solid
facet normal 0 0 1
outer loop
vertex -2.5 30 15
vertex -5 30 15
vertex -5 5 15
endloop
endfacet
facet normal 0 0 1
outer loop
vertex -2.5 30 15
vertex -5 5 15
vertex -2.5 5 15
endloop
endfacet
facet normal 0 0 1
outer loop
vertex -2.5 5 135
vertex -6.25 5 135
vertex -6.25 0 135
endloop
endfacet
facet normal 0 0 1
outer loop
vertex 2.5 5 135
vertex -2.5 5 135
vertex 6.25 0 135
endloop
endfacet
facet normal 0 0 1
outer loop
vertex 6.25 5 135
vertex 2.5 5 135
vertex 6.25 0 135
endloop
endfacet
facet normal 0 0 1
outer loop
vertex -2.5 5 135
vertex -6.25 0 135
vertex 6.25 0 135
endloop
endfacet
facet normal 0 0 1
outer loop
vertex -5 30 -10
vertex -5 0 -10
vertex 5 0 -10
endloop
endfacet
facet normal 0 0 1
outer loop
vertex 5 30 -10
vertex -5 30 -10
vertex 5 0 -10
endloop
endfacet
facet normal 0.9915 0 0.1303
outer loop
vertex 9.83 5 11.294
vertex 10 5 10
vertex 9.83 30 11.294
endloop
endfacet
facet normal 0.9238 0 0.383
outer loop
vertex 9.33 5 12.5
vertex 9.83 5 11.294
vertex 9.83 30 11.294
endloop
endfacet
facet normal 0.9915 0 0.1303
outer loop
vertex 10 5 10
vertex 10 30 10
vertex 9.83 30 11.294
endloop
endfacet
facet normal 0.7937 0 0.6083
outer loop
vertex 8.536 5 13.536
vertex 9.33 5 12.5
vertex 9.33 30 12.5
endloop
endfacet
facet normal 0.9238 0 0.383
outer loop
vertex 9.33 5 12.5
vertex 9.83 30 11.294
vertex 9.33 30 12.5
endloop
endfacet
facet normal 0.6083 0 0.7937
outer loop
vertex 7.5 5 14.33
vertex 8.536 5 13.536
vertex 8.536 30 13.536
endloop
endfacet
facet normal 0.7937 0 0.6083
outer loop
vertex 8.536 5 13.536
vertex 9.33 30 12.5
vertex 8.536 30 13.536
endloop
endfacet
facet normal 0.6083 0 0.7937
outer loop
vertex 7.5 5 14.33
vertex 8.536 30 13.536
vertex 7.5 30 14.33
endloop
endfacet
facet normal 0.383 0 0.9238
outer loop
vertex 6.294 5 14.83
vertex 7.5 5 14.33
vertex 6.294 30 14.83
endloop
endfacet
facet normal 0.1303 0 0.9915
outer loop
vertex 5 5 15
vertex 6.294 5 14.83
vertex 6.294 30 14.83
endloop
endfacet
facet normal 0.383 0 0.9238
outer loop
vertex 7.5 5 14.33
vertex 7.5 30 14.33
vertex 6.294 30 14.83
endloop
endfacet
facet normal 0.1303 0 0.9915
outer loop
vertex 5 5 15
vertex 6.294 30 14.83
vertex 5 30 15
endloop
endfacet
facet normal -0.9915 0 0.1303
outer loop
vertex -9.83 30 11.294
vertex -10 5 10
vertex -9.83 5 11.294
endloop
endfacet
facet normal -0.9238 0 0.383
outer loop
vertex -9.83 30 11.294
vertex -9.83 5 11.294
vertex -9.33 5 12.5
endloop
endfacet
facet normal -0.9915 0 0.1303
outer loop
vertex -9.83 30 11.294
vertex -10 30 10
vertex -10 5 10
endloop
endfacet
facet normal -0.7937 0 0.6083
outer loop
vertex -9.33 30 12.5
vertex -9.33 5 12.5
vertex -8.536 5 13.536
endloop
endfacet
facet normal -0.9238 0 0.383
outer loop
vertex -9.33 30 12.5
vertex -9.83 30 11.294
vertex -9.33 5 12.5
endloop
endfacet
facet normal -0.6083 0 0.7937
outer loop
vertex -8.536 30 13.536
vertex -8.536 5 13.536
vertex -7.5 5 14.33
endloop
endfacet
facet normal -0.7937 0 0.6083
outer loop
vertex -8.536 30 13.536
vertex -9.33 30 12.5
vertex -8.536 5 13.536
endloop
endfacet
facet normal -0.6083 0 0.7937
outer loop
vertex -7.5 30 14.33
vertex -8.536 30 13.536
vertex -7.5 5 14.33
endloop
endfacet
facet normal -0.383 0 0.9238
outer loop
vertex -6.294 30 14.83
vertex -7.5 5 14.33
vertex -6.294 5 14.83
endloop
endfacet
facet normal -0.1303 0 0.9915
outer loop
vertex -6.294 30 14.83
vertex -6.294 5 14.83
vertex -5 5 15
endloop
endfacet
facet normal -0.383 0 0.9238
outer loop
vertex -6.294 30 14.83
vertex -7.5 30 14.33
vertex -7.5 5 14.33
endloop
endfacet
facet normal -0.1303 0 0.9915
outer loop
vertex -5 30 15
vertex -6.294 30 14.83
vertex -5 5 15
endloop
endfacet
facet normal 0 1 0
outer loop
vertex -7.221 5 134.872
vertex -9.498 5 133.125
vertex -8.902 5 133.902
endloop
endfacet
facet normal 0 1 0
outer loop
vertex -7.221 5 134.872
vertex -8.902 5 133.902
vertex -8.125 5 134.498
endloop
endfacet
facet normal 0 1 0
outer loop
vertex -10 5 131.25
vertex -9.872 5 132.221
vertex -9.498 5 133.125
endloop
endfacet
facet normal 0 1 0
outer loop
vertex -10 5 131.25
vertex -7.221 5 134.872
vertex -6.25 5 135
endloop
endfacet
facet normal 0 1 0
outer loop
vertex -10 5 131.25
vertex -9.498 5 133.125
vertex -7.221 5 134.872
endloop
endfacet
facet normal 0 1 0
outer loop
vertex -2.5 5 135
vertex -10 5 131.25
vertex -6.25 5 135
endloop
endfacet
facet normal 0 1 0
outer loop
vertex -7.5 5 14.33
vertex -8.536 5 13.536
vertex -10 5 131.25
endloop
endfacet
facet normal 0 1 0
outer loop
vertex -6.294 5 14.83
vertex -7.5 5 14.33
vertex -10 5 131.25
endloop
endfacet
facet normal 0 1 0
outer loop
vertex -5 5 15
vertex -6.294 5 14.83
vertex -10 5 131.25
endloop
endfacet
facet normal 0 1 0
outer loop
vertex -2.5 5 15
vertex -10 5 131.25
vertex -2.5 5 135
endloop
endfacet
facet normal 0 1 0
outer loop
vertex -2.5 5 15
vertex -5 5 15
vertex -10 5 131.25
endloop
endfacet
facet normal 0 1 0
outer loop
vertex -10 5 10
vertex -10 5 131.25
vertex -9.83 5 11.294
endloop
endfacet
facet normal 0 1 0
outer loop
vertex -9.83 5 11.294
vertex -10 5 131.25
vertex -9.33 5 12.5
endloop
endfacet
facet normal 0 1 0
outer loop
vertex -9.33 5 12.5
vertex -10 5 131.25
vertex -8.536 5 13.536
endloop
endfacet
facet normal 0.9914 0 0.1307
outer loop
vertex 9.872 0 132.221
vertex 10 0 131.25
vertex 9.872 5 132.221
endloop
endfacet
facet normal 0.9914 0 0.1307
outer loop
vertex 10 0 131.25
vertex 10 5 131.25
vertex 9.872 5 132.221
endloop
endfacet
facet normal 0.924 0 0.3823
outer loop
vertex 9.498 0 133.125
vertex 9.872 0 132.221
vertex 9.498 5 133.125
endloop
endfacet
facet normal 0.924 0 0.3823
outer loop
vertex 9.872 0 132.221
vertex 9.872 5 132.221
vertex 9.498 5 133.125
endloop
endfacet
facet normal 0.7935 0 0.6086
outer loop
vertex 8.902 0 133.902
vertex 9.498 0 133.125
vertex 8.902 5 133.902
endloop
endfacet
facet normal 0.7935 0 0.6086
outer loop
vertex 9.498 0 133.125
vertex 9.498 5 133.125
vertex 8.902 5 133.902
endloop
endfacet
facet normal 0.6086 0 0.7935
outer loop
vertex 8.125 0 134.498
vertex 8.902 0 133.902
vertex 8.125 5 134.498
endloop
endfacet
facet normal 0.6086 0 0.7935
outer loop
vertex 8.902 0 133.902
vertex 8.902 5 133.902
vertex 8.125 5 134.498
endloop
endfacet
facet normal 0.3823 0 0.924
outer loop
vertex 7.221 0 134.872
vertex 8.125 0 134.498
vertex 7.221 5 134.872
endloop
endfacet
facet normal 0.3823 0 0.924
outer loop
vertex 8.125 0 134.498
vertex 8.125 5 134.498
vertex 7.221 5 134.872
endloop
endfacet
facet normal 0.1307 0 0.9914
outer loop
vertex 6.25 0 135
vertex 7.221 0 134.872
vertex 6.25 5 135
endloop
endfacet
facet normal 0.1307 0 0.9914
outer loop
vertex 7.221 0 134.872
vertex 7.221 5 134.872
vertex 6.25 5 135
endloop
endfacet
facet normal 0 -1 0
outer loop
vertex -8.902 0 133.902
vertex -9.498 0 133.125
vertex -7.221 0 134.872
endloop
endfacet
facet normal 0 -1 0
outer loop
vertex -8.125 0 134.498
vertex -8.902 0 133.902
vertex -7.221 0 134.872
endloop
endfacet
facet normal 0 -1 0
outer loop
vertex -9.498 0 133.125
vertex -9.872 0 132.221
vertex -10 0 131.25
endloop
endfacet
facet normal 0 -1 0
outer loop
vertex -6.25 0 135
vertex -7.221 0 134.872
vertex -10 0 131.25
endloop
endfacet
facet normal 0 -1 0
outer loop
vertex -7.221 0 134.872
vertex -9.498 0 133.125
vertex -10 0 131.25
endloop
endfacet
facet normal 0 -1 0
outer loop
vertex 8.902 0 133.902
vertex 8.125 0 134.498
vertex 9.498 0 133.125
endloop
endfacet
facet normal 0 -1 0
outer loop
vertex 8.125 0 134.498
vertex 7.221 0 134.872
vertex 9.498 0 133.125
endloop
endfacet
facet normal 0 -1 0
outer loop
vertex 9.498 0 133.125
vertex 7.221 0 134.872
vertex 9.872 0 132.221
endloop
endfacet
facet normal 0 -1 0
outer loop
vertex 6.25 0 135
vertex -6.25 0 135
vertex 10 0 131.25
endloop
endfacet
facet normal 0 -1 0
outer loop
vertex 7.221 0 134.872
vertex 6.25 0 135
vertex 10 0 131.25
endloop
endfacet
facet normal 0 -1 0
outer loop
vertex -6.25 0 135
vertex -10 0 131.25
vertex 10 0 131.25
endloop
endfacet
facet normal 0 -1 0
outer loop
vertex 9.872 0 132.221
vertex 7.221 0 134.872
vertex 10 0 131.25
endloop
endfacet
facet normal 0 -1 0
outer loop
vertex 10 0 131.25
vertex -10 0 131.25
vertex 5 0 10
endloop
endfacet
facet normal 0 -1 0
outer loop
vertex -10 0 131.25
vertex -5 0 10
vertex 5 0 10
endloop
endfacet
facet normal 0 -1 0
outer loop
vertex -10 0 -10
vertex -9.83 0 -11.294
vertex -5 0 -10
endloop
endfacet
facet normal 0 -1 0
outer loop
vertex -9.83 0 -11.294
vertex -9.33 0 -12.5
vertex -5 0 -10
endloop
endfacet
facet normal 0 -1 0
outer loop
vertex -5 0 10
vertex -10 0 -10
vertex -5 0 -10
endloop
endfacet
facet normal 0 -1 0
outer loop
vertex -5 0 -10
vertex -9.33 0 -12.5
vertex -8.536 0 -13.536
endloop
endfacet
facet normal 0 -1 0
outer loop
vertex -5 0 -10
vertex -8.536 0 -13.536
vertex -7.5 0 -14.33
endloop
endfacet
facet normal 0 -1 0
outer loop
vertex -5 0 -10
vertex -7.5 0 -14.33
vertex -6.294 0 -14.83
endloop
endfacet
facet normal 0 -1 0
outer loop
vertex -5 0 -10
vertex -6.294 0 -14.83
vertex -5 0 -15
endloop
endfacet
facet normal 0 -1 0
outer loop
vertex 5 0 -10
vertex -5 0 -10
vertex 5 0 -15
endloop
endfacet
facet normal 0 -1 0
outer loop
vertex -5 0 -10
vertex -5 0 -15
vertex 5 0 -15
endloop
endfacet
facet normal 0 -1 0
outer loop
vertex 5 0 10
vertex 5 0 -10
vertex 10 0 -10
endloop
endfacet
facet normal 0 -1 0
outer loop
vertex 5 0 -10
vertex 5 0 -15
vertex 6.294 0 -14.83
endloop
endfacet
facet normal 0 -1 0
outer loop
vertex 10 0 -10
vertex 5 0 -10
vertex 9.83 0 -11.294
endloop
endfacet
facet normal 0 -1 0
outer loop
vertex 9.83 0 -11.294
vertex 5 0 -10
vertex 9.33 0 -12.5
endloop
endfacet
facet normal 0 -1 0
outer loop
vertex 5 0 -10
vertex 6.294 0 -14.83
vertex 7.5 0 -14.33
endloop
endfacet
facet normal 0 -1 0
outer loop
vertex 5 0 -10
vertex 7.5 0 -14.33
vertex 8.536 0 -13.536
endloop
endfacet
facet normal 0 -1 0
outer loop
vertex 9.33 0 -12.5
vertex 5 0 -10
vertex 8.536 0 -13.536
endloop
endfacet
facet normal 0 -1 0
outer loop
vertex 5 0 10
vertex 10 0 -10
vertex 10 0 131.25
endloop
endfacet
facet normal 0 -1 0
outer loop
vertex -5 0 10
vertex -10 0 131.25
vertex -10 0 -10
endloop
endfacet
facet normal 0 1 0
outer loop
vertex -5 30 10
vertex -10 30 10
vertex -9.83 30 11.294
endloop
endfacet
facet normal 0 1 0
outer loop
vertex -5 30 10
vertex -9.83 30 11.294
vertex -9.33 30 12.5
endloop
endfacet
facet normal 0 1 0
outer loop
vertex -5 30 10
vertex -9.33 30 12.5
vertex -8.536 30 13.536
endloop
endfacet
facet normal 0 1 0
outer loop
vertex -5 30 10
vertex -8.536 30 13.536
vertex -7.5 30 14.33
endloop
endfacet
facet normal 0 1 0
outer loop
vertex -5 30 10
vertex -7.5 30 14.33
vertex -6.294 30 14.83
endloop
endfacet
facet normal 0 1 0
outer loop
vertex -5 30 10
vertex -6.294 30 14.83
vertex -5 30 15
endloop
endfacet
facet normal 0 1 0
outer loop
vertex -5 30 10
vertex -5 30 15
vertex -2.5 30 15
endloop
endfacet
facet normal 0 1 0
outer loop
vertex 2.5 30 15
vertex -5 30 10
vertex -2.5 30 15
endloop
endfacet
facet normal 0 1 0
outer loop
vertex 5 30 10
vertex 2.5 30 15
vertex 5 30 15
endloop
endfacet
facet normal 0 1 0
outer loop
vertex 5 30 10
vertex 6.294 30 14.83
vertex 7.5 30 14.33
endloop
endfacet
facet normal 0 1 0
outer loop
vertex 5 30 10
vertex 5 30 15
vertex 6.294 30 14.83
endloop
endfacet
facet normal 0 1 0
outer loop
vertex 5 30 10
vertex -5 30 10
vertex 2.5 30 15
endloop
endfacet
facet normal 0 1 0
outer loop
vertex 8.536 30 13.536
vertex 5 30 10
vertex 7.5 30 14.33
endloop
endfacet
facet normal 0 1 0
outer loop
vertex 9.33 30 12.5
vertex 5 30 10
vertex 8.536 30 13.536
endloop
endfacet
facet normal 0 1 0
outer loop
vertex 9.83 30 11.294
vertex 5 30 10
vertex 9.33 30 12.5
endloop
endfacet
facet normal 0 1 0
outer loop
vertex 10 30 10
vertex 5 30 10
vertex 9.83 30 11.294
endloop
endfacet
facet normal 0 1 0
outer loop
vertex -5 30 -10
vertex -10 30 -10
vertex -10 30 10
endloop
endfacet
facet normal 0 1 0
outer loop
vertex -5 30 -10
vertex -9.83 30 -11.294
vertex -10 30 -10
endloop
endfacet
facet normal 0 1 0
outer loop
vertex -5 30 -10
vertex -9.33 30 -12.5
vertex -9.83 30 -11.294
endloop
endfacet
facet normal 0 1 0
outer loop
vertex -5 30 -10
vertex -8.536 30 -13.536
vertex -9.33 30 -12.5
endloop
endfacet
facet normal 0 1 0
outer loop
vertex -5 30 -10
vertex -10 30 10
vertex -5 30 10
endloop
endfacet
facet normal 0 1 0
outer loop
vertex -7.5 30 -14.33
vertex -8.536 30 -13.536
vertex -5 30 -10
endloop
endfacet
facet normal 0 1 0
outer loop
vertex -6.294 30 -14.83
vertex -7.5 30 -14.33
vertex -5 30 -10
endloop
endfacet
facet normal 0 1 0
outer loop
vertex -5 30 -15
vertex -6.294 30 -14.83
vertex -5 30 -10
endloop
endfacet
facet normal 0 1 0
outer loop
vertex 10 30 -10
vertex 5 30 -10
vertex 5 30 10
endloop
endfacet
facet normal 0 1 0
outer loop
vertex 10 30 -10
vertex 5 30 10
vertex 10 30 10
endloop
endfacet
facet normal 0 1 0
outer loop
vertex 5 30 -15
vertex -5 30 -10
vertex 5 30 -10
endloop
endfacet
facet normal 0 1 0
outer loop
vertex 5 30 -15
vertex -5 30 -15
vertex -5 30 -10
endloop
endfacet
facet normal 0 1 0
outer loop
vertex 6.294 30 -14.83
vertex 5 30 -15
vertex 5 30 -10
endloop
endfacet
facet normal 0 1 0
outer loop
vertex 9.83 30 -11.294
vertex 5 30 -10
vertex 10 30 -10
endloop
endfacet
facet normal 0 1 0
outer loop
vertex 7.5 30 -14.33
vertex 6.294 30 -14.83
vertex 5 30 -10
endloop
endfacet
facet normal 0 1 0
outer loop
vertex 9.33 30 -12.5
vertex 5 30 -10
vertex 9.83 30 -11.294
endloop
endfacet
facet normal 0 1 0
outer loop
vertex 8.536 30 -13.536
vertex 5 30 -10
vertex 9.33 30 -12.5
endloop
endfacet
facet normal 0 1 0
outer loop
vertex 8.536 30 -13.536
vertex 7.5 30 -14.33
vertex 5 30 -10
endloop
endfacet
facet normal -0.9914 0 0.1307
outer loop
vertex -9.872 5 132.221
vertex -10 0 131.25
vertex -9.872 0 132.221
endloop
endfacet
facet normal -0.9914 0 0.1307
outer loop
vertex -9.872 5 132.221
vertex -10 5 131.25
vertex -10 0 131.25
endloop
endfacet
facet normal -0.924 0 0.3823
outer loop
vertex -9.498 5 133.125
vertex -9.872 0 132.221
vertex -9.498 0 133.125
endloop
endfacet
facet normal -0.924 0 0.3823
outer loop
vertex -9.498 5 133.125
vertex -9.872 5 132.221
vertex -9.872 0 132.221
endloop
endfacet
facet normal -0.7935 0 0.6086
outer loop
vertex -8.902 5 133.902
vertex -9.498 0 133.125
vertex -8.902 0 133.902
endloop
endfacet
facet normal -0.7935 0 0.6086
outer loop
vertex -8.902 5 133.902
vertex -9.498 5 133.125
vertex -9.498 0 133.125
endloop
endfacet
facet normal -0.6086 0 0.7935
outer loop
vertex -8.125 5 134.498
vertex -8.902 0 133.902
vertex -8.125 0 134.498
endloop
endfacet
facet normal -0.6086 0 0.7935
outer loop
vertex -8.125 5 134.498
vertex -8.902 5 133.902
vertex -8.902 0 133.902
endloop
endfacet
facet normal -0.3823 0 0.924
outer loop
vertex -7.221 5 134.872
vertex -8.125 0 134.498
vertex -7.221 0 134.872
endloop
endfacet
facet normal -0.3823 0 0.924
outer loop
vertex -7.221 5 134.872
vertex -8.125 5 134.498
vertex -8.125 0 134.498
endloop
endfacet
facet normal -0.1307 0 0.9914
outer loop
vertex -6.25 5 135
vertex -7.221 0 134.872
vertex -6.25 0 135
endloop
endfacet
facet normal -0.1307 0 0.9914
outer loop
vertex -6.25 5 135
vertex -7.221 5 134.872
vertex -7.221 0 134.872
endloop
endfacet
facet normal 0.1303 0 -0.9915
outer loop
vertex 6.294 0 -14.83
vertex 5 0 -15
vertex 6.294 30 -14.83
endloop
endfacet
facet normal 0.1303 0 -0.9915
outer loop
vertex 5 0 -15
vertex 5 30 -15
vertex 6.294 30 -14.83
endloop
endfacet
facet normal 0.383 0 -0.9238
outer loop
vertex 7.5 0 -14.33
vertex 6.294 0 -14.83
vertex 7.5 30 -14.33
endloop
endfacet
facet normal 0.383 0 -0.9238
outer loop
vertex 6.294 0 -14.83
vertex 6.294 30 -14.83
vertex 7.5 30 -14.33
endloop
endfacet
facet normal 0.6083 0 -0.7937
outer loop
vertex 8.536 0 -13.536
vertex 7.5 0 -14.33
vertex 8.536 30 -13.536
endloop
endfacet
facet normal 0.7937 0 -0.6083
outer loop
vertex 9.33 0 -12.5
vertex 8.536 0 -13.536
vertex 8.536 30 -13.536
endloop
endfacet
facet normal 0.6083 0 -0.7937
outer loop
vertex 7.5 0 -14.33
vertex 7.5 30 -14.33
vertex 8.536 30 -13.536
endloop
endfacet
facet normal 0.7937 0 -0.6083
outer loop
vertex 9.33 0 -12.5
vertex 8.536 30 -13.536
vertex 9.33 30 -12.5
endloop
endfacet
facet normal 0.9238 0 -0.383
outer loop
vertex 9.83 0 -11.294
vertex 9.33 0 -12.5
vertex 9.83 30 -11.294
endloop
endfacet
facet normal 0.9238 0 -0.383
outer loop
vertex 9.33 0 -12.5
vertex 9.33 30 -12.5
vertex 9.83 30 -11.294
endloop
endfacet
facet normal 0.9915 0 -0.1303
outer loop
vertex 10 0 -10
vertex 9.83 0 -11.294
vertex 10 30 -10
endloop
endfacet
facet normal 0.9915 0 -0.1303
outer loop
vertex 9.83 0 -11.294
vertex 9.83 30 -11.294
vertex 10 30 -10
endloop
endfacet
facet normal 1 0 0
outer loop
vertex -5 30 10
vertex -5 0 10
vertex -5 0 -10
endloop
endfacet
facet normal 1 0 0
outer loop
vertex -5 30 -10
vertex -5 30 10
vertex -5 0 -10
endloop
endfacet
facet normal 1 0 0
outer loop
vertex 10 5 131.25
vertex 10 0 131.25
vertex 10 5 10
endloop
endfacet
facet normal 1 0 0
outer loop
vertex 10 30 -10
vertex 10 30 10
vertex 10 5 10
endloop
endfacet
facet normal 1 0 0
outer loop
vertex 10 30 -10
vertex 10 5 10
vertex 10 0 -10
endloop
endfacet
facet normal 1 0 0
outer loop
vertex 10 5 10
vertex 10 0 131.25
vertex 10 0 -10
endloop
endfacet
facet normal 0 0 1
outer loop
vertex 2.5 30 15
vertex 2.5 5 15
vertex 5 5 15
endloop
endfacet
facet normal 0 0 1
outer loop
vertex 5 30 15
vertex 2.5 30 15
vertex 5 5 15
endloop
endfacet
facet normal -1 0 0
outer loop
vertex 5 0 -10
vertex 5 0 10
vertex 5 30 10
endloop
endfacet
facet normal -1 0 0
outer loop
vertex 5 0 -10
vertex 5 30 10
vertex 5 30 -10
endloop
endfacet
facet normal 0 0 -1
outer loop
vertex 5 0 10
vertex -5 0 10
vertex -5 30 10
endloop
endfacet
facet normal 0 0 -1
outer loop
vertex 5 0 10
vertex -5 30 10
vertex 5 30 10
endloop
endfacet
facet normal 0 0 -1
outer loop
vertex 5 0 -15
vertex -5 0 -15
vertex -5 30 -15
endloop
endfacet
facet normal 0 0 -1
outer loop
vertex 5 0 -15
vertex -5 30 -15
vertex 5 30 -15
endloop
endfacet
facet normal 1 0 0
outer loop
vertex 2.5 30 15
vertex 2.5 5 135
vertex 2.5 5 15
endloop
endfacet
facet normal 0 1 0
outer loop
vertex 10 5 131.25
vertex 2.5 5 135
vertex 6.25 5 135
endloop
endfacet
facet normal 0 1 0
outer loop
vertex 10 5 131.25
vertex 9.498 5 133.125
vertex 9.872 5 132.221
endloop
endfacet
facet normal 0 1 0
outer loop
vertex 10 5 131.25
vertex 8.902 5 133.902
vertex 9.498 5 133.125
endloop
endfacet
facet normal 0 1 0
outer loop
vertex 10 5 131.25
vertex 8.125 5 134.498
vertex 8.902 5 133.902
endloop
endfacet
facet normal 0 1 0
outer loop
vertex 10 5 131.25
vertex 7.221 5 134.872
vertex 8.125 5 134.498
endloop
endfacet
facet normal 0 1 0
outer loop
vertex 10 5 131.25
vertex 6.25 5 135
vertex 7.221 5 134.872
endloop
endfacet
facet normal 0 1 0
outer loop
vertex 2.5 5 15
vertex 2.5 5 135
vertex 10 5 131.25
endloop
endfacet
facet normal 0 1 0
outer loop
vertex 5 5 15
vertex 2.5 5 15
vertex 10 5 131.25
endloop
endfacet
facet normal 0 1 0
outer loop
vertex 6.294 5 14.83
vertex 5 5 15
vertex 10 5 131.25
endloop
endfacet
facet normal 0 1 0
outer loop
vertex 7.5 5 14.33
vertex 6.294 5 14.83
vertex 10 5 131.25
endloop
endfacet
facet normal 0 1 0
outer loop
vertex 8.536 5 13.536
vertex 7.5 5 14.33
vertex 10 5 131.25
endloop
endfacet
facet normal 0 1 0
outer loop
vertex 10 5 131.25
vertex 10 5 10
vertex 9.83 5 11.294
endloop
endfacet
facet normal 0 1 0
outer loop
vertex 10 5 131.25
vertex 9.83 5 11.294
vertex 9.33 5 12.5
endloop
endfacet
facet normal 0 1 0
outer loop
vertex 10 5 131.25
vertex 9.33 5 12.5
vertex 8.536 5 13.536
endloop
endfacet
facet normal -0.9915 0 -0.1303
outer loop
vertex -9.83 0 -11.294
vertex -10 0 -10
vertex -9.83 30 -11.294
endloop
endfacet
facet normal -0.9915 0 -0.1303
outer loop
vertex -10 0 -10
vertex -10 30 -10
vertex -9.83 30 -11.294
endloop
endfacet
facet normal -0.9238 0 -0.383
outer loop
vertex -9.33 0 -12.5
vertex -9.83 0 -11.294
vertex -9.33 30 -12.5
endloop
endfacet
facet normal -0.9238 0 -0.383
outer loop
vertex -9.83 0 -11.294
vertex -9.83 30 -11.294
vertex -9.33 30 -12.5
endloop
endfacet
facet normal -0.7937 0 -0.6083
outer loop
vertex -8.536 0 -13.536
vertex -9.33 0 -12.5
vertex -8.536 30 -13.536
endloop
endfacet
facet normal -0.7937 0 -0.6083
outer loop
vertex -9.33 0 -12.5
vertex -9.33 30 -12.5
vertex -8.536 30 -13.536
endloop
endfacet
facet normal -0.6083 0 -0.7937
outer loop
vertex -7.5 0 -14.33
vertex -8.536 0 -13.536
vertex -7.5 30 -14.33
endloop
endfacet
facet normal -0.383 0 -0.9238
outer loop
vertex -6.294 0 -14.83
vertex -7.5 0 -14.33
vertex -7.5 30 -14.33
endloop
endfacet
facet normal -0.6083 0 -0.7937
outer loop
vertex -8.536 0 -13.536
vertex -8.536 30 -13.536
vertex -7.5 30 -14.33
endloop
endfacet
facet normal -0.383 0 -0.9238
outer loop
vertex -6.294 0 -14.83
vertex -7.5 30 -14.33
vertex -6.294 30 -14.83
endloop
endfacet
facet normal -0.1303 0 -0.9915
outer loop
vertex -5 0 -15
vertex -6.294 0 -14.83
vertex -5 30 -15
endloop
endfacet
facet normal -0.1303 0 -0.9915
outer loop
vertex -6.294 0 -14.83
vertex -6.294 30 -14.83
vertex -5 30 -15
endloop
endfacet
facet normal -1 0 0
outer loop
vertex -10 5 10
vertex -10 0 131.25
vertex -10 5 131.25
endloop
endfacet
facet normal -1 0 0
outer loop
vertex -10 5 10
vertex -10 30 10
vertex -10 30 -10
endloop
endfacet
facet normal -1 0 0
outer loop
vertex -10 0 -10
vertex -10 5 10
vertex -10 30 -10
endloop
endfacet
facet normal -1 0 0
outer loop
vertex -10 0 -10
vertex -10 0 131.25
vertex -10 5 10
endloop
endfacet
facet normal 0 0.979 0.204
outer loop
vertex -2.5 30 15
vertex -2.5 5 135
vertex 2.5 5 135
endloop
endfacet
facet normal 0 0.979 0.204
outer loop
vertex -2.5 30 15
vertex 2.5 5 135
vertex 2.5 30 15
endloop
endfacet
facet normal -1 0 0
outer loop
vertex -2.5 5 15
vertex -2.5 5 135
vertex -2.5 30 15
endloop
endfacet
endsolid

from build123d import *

# Parameters (mm, degrees)
SKETCH_1_W      = 20
SKETCH_1_H      = 30
SKETCH_1_W_2    = 10
SKETCH_1_H_2    = 20
EXTRUDE_1_DEPTH = 30
SKETCH_1_3_W    = 20
SKETCH_1_3_H    = 120
EXTRUDE_2_DEPTH = 5
RIB_1_REACH     = 140.654
SKETCH_2_WALL_W = 401.884999198
SKETCH_2_WALL_H = 5
FILLET_1_R      = 5
FILLET_3_R      = 3.75


with BuildPart() as part:
    # Эскиз1 → Бобышка-Вытянуть1 (new body)
    with BuildSketch(Plane(origin=(0, 0, 0), x_dir=(1, 0, 0), z_dir=(0, 1, 0))):
        Rectangle(SKETCH_1_W, SKETCH_1_H)
        Rectangle(SKETCH_1_W_2, SKETCH_1_H_2, mode=Mode.SUBTRACT)
    extrude(amount=EXTRUDE_1_DEPTH)

    # Эскиз1<3> → Бобышка-Вытянуть2 (add)
    with BuildSketch(Plane(origin=(0, 0, 0), x_dir=(1, 0, 0), z_dir=(0, 1, 0))):
        with Locations((0, -75)):
            Rectangle(SKETCH_1_3_W, SKETCH_1_3_H)
    extrude(amount=EXTRUDE_2_DEPTH)

    # Эскиз2 wall → Ребро1 (add, up to next)
    with BuildSketch(Plane(origin=(0, 17.5, 75), x_dir=(0, 0.203954254112, -0.978980419738), z_dir=(0, 0.978980419738, 0.203954254112)), mode=Mode.PRIVATE) as rib_1_sk1:
        Rectangle(SKETCH_2_WALL_W, SKETCH_2_WALL_H)
    rib_1_tool1 = extrude(rib_1_sk1.sketch, amount=-RIB_1_REACH, mode=Mode.PRIVATE) - part.part
    add(rib_1_tool1.solids().sort_by_distance((0, 17.5, 75))[0])

    # Скругление1
    fillet_1_edges = [part.edges().sort_by_distance(p)[0] for p in [
        (-10, 15, -15),
        (10, 15, -15),
        (10, 17.5, 15),
        (-10, 17.5, 15),
    ]]
    fillet(fillet_1_edges, radius=FILLET_1_R)

    # Скругление3
    fillet_3_edges = [part.edges().sort_by_distance(p)[0] for p in [
        (-10, 2.5, 135),
        (10, 2.5, 135),
    ]]
    fillet(fillet_3_edges, radius=FILLET_3_R)


solid = part.part
